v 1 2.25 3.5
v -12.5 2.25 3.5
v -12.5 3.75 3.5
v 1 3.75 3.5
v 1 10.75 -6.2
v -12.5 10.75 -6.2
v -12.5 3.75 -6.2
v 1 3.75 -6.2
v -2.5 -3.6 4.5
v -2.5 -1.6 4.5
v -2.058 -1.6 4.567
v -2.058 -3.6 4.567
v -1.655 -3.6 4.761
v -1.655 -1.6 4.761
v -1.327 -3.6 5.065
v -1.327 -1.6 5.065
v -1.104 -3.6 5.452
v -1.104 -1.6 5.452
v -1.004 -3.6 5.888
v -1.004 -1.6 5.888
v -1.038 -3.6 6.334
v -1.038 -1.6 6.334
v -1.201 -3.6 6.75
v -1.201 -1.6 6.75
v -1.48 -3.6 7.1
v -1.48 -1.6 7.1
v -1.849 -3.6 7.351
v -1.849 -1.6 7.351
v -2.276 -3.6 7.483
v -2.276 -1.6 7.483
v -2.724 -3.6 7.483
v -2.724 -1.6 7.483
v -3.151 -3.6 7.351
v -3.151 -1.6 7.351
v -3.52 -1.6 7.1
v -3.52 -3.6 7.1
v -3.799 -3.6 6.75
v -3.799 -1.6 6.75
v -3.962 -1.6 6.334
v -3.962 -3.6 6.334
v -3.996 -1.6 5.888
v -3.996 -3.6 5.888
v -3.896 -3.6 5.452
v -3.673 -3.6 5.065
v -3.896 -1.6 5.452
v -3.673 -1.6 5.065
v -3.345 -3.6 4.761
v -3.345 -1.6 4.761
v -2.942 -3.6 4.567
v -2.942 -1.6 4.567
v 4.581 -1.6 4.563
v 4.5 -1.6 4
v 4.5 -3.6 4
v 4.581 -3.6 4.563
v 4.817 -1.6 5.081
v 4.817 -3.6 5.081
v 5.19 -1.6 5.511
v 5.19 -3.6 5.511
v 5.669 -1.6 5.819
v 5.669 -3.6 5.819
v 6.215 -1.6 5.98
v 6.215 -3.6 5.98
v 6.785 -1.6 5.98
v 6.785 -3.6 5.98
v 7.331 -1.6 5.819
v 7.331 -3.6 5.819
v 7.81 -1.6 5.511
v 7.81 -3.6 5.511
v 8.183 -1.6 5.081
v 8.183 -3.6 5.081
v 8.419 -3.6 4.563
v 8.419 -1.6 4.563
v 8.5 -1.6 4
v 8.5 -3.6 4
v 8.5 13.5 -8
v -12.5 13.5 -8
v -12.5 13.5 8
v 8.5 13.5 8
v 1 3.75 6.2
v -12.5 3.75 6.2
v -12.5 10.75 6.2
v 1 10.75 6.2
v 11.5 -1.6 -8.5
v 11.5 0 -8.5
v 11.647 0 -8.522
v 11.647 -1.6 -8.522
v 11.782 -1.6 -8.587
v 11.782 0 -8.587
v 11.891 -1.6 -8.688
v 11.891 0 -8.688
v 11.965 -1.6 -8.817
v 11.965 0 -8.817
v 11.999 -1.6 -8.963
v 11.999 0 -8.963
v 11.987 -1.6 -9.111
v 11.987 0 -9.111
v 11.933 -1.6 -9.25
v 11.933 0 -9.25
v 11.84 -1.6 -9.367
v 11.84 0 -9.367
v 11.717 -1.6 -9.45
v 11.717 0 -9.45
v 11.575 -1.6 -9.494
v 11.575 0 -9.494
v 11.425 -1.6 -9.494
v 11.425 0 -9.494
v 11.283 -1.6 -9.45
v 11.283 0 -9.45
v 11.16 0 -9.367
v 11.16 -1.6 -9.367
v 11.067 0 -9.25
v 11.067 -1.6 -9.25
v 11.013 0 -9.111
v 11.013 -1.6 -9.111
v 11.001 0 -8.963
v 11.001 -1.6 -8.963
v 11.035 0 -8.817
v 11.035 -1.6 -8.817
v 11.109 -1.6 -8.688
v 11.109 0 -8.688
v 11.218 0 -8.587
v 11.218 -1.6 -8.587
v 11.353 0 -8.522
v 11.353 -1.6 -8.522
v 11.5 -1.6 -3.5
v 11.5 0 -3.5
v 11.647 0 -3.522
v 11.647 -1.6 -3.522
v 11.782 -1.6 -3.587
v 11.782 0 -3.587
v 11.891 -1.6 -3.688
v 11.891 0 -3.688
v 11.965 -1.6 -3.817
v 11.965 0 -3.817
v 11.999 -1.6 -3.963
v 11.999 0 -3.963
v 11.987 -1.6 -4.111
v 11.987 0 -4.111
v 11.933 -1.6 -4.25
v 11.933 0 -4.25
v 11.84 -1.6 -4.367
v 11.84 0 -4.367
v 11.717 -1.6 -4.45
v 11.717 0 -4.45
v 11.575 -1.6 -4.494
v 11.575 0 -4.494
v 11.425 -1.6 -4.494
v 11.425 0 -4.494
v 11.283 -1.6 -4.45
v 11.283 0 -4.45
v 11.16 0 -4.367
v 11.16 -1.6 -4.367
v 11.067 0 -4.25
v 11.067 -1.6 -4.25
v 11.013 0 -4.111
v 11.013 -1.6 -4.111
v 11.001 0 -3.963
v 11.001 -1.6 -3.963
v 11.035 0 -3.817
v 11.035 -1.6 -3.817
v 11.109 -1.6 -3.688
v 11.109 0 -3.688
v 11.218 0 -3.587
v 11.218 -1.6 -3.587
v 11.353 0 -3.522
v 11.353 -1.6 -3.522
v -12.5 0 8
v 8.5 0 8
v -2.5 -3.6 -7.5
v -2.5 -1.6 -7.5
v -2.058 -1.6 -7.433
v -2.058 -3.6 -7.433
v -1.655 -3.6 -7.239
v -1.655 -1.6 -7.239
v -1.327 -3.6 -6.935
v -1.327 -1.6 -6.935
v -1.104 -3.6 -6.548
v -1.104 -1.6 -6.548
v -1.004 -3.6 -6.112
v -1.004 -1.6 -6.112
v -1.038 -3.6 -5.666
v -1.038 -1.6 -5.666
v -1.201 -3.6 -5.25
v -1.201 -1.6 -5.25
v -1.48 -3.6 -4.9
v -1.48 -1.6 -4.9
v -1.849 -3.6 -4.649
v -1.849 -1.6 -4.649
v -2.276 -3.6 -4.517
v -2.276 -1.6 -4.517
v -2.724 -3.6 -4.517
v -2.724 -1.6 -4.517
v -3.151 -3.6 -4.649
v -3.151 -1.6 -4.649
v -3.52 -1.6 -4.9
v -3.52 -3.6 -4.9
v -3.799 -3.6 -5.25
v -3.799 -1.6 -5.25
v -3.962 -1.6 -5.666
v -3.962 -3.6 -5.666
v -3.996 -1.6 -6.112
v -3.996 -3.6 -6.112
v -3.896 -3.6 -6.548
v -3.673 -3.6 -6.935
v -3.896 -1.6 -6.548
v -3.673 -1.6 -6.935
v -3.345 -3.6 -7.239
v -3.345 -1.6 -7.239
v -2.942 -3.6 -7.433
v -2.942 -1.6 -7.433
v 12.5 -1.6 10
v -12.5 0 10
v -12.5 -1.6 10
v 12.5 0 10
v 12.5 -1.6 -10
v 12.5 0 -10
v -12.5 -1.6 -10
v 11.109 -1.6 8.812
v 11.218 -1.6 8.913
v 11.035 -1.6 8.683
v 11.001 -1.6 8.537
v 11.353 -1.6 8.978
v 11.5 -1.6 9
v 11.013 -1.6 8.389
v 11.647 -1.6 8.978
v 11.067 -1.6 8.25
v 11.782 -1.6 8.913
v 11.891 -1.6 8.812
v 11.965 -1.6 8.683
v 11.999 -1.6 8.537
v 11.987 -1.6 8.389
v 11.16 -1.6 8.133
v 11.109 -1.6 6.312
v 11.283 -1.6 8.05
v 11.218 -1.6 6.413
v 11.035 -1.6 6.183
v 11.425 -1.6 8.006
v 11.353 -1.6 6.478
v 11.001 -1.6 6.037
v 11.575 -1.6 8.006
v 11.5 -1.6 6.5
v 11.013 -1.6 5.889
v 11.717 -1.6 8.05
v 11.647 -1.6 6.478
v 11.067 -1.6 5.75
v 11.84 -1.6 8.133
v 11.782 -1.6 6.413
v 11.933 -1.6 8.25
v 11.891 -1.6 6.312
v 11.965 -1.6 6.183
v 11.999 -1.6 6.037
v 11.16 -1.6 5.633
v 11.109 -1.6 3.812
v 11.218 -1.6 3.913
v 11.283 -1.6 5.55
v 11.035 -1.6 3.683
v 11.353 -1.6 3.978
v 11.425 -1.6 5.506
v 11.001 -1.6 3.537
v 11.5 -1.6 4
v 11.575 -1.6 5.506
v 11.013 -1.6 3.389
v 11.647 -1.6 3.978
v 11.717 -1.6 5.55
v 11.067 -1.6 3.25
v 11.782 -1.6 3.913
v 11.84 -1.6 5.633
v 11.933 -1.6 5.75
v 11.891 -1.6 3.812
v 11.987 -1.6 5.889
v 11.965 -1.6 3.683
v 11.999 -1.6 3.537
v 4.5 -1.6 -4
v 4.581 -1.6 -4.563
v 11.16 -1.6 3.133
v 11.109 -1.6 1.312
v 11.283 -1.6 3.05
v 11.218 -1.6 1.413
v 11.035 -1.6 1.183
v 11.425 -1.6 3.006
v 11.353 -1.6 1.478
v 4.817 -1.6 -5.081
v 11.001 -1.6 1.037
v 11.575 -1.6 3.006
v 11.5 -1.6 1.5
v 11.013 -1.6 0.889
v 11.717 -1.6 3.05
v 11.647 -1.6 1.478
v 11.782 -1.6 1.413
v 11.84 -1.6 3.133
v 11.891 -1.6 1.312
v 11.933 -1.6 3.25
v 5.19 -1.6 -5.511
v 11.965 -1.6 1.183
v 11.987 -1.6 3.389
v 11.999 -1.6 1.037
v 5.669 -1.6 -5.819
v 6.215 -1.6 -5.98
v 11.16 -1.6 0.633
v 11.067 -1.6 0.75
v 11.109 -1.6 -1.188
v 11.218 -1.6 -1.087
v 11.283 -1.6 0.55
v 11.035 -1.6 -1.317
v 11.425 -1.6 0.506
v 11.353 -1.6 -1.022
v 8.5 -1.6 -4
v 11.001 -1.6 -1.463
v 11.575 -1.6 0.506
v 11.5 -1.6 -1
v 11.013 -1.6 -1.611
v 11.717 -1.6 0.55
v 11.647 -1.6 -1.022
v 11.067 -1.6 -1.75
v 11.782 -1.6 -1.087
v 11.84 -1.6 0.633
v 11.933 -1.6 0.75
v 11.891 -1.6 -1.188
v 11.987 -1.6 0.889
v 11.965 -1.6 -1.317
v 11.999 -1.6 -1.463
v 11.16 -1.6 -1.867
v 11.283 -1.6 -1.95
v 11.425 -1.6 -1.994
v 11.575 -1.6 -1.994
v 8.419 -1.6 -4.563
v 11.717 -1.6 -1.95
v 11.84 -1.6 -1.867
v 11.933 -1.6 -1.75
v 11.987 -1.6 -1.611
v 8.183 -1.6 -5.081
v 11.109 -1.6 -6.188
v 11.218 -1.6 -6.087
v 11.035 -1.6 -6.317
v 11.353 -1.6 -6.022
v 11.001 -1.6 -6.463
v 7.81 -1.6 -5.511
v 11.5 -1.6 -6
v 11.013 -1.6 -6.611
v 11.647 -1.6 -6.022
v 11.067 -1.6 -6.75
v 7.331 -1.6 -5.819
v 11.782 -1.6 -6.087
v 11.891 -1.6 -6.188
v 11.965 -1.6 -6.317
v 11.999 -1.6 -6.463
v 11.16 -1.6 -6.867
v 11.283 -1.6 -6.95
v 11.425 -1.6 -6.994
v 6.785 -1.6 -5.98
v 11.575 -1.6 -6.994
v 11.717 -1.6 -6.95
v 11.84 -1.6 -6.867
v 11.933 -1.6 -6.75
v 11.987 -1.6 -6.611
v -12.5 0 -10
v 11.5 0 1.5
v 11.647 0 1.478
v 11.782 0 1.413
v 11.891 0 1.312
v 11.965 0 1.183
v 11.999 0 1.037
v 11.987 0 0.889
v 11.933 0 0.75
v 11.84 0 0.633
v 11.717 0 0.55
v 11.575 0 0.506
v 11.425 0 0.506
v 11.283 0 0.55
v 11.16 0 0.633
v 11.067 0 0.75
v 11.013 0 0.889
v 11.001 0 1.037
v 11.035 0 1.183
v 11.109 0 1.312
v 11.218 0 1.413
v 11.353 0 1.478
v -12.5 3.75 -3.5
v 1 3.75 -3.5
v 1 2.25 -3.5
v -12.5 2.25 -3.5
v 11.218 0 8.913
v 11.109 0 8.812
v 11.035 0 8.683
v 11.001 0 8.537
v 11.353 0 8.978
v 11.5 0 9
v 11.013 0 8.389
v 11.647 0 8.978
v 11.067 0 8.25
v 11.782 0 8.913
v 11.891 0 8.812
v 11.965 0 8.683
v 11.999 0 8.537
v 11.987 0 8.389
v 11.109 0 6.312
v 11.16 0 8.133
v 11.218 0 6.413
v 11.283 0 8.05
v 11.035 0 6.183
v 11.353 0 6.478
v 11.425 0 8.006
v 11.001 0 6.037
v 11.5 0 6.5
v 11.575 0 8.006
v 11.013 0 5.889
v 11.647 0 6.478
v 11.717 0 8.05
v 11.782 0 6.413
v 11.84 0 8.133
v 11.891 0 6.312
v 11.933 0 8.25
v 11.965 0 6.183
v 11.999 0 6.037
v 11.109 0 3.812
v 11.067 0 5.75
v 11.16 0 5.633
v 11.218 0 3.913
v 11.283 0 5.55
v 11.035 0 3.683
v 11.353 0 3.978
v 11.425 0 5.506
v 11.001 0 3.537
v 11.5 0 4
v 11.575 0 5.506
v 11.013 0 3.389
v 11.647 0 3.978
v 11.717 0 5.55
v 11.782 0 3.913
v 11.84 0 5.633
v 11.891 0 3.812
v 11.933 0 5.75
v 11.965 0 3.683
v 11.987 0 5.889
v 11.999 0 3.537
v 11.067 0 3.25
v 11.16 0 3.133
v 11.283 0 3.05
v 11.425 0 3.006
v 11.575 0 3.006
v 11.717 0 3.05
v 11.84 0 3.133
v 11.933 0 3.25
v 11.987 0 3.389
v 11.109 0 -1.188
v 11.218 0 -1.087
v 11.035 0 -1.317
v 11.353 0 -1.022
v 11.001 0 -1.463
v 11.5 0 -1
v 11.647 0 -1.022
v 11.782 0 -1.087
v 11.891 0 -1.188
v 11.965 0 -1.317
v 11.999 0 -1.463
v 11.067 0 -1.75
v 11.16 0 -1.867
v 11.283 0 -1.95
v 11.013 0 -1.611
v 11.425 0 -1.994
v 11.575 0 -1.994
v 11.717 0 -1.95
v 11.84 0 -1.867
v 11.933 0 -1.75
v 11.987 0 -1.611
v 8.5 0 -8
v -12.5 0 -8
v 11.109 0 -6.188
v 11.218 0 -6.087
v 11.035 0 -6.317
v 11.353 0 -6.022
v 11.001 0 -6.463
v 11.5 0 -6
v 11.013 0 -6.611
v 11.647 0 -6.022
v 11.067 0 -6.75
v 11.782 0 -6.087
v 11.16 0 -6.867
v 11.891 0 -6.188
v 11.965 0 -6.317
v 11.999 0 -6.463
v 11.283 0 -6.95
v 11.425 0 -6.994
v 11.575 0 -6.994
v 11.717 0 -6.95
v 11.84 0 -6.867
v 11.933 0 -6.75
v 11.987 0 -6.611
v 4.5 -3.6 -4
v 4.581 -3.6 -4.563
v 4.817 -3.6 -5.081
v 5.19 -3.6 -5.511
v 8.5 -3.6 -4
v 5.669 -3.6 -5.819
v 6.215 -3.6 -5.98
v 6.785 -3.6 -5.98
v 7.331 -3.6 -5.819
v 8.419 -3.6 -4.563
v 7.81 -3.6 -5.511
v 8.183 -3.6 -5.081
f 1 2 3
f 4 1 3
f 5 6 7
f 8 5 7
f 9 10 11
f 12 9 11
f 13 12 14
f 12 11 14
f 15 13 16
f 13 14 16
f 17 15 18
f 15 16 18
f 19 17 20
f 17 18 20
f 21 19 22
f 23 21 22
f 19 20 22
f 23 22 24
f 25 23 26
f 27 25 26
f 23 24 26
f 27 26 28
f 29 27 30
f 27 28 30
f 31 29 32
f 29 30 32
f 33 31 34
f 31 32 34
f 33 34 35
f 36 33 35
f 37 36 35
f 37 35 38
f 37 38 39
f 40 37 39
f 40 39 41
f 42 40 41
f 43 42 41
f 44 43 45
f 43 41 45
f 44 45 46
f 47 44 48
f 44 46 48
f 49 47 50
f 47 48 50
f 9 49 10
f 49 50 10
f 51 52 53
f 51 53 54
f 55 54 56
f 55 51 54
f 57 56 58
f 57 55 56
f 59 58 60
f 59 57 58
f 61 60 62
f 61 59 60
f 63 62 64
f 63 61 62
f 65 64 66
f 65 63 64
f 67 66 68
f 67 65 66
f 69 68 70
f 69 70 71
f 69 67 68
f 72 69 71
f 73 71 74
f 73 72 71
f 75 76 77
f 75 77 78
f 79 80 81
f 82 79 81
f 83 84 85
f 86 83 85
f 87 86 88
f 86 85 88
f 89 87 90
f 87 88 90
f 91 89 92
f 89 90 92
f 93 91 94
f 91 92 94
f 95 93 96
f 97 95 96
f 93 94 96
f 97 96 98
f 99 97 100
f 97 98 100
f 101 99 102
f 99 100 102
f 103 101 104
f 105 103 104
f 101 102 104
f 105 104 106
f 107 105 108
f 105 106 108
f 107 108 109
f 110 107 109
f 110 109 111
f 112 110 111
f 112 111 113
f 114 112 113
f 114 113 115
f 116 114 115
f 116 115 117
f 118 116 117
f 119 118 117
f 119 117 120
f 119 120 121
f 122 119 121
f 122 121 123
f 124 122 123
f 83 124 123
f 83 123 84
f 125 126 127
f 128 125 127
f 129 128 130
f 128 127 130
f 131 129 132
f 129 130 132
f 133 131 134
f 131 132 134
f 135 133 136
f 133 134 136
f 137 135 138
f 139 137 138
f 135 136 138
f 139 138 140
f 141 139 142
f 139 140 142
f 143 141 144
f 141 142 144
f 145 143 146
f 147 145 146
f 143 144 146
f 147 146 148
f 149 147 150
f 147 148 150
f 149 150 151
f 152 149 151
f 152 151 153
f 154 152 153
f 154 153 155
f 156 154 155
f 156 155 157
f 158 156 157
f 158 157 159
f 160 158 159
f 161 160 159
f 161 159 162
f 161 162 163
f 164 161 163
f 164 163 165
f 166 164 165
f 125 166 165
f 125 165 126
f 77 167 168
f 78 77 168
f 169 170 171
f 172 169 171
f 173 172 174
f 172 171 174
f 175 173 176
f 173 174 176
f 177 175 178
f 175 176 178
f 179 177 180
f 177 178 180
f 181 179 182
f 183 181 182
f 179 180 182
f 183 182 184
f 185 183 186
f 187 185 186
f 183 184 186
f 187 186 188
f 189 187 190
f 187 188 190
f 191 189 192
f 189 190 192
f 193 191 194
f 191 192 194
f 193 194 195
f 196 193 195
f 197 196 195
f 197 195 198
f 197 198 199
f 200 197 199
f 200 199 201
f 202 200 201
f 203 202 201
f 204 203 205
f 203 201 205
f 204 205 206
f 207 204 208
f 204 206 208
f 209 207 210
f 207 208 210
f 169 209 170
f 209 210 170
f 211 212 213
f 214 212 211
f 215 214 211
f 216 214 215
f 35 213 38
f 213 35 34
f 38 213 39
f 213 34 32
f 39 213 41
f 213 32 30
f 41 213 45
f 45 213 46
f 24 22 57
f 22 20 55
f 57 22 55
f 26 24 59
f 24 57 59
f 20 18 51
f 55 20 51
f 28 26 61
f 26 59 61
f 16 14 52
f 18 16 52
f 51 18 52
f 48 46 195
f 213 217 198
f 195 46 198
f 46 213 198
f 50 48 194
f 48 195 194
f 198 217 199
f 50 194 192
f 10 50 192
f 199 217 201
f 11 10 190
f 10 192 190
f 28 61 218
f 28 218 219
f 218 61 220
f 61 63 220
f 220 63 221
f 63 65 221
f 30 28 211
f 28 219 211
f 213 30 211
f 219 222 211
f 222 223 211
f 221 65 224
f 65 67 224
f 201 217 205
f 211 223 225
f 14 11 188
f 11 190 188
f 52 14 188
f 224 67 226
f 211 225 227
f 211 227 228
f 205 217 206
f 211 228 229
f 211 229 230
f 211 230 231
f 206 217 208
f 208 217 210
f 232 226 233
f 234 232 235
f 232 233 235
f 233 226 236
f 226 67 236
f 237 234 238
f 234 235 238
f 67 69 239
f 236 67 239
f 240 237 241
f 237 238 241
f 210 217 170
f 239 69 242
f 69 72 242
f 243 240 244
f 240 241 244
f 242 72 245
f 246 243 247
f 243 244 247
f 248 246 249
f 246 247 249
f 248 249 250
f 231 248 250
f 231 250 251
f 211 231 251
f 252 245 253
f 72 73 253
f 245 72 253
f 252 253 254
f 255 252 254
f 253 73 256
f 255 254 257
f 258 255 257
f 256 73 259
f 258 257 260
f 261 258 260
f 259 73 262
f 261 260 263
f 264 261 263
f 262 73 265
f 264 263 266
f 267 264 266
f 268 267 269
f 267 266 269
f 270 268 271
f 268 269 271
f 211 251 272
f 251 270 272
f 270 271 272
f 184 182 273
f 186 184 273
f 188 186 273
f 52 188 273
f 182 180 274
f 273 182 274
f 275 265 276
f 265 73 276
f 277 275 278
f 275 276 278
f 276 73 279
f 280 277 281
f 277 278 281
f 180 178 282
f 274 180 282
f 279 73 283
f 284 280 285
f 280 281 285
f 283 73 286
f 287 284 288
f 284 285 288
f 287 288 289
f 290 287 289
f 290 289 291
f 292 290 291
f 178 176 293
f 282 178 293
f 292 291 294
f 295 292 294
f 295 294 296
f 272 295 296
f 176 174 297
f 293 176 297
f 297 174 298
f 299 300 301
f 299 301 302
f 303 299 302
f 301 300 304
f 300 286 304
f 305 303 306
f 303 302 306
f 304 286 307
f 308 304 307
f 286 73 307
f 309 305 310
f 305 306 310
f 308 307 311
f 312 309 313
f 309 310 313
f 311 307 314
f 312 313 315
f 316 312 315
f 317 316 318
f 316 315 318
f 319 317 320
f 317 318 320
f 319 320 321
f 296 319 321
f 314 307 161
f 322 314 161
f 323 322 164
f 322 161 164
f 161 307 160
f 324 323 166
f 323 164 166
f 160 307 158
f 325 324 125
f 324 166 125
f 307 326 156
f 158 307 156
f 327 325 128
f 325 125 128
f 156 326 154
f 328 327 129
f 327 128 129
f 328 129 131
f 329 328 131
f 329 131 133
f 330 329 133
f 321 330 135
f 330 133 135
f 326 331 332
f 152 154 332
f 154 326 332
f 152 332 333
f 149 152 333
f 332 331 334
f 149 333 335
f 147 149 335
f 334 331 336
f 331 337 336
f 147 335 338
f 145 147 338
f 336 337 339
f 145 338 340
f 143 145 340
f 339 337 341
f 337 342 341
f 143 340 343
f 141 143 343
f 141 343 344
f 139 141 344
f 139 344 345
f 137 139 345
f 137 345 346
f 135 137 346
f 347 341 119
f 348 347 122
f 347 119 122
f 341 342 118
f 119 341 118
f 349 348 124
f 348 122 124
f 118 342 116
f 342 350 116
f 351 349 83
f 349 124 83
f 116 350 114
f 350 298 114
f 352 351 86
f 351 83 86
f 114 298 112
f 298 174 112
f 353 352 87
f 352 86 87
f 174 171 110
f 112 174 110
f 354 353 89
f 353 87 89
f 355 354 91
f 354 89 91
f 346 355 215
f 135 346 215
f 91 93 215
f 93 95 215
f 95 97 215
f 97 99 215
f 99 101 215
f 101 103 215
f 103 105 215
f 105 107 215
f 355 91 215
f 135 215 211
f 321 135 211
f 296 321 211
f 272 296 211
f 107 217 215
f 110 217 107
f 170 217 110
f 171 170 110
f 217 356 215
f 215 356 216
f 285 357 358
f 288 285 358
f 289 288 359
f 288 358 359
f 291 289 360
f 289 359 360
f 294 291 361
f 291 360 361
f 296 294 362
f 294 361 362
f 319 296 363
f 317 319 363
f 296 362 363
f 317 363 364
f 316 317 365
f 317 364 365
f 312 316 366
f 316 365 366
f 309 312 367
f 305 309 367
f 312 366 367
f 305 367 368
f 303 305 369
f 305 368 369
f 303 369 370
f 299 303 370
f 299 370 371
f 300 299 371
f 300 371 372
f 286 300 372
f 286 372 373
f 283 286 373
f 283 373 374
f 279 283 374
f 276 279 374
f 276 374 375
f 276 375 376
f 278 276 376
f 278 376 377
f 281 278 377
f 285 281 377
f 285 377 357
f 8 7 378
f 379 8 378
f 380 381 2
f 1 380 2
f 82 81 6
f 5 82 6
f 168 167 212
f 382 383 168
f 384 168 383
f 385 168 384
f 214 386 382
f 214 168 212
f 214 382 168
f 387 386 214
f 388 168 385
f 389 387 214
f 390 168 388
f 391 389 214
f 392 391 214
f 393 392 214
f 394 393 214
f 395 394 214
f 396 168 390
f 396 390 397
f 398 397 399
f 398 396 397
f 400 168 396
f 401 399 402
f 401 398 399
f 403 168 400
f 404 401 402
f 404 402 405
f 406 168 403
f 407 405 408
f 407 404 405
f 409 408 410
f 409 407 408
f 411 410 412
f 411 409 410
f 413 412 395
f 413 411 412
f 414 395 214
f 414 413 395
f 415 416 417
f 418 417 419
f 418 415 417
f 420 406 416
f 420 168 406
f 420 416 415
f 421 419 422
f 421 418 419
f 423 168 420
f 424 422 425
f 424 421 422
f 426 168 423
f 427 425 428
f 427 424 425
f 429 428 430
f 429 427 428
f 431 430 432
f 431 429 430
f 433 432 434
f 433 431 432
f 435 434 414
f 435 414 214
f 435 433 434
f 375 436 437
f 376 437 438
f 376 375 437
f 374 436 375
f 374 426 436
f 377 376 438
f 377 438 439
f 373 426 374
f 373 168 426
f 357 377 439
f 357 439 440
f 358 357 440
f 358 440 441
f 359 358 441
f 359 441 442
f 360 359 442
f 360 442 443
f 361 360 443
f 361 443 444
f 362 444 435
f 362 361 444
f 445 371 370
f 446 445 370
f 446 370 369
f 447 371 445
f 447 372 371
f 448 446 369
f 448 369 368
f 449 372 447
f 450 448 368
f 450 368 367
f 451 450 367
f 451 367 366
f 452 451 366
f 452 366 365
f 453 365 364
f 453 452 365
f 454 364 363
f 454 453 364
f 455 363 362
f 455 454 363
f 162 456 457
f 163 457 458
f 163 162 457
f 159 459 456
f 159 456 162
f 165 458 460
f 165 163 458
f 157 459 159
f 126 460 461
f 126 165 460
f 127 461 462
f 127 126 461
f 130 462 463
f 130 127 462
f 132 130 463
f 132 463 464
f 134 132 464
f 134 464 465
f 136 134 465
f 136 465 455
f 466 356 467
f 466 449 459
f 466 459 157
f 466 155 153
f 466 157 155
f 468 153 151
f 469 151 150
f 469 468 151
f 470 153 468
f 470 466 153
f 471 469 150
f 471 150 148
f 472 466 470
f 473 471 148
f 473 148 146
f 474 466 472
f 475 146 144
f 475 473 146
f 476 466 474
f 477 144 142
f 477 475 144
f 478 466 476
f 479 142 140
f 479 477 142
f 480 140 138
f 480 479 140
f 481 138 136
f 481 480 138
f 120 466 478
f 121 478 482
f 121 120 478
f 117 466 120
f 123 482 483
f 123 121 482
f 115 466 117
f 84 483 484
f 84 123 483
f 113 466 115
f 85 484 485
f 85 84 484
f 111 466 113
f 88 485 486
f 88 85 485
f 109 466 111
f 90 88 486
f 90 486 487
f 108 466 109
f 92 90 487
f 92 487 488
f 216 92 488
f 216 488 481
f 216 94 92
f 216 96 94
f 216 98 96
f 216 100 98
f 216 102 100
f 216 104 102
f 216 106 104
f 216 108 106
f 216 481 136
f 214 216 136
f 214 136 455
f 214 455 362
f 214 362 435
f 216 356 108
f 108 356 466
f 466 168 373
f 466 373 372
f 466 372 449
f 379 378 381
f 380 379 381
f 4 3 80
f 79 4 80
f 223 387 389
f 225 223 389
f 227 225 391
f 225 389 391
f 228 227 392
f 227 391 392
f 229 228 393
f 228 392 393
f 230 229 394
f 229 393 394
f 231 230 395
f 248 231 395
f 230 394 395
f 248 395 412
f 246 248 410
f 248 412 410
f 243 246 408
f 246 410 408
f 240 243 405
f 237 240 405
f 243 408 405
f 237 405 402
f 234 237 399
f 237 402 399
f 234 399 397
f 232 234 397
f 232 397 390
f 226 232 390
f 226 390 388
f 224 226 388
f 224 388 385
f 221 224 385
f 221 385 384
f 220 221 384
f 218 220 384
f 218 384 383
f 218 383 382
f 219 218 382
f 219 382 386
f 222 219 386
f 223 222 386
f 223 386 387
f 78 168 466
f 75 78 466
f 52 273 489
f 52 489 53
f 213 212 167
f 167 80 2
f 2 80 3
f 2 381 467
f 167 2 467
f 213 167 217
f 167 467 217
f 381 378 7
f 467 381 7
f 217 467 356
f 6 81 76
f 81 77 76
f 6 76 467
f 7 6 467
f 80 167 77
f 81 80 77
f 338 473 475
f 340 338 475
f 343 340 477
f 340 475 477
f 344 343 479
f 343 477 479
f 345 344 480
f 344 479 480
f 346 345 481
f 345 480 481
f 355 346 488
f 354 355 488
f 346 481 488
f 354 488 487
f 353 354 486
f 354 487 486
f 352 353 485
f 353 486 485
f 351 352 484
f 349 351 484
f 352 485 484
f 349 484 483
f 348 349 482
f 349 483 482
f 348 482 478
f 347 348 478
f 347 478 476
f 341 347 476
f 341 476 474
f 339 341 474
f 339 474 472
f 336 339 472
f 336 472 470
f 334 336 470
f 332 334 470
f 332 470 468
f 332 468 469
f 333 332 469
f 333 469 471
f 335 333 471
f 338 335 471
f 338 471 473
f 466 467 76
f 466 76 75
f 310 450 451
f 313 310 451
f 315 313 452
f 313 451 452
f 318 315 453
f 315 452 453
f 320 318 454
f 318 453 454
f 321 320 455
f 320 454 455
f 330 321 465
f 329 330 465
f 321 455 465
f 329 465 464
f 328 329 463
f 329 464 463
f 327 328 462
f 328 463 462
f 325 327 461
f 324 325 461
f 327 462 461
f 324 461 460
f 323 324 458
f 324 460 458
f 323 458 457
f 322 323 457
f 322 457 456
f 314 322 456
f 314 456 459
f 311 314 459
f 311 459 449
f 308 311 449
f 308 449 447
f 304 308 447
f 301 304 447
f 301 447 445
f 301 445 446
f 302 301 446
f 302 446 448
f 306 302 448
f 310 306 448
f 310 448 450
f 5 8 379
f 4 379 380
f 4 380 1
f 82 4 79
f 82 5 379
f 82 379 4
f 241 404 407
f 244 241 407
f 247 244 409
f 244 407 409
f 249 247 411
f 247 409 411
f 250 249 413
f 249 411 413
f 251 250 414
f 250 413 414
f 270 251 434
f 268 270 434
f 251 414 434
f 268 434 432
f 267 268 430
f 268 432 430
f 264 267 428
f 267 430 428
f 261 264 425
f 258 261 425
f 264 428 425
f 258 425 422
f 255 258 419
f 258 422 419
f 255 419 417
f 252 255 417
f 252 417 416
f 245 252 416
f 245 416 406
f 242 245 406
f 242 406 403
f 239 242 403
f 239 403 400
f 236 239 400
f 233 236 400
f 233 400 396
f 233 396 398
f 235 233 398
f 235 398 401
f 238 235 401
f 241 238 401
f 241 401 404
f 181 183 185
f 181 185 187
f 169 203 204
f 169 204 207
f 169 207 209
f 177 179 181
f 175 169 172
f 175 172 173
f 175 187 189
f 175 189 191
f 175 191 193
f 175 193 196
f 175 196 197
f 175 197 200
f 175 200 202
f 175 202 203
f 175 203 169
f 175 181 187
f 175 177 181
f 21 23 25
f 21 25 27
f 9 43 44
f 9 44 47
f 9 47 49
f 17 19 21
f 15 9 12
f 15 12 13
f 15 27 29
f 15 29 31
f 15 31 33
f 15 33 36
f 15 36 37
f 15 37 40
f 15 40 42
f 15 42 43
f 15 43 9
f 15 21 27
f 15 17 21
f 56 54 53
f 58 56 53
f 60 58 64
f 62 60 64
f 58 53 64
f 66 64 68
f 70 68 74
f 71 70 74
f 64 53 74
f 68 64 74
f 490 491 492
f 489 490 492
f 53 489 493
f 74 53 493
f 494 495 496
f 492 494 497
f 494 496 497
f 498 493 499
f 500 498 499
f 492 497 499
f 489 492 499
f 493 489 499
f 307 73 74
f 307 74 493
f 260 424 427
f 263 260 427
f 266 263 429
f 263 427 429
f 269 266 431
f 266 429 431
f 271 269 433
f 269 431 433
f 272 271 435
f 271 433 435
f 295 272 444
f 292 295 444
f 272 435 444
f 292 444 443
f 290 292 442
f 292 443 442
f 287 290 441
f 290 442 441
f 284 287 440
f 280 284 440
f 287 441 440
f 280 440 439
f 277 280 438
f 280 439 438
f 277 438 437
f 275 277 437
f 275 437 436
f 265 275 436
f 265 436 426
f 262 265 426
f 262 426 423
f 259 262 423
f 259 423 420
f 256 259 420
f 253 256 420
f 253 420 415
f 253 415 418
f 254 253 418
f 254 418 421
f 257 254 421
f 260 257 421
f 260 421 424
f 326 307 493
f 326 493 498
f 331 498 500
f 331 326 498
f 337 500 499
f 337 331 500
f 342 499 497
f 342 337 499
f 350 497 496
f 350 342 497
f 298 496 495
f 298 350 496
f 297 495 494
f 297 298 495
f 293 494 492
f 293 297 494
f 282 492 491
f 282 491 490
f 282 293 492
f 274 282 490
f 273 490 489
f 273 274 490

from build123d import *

# Parameters (mm, degrees)
SKETCH1_W           = 25
SKETCH1_H           = 20
BOSS_EXTRUDE1_DEPTH = 1.6
SKETCH2_W           = 21
SKETCH2_H           = 16
BOSS_EXTRUDE2_DEPTH = 13.5
CUT_EXTRUDE1_DEPTH  = 13.5
SKETCH4_R           = 0.5
CUT_EXTRUDE2_DEPTH  = 13.5
BOSS_EXTRUDE3_DEPTH = 2
SKETCH6_R           = 1.5
BOSS_EXTRUDE4_DEPTH = 2


with BuildPart() as part:
    # Sketch1 → Boss-Extrude1 (new body)
    with BuildSketch(Plane(origin=(0, 0, 0), x_dir=(1, 0, 0), z_dir=(0, 1, 0))):
        Rectangle(SKETCH1_W, SKETCH1_H)
    extrude(amount=-BOSS_EXTRUDE1_DEPTH)

    # Sketch2 → Boss-Extrude2 (add)
    with BuildSketch(Plane(origin=(0, 0, 0), x_dir=(1, 0, 0), z_dir=(0, 1, 0))):
        with Locations((-2, 0)):
            Rectangle(SKETCH2_W, SKETCH2_H)
    extrude(amount=BOSS_EXTRUDE2_DEPTH)

    # Sketch3 → Cut-Extrude1 (cut)
    with BuildSketch(Plane.ZY.offset(12.5)):
        Polygon((-6.2, 3.75), (-3.5, 3.75), (-3.5, 2.25), (3.5, 2.25), (3.5, 3.75), (6.2, 3.75), (6.2, 10.75), (-6.2, 10.75), align=None)
    extrude(amount=-CUT_EXTRUDE1_DEPTH, mode=Mode.SUBTRACT)

    # Sketch4 → Cut-Extrude2 (cut)
    with BuildSketch(Plane(origin=(0, 0, 0), x_dir=(1, 0, 0), z_dir=(0, 1, 0))):
        with Locations(Location((11.5, 9, 0), (0, 0, 270))):
            Circle(SKETCH4_R)
        with Locations(Location((11.5, 6.5, 0), (0, 0, 270))):
            Circle(SKETCH4_R)
        with Locations(Location((11.5, 4, 0), (0, 0, 270))):
            Circle(SKETCH4_R)
        with Locations(Location((11.5, 1.5, 0), (0, 0, 270))):
            Circle(SKETCH4_R)
        with Locations(Location((11.5, -1, 0), (0, 0, 270))):
            Circle(SKETCH4_R)
        with Locations(Location((11.5, -3.5, 0), (0, 0, 270))):
            Circle(SKETCH4_R)
        with Locations(Location((11.5, -6, 0), (0, 0, 270))):
            Circle(SKETCH4_R)
        with Locations(Location((11.5, -8.5, 0), (0, 0, 270))):
            Circle(SKETCH4_R)
    extrude(amount=-CUT_EXTRUDE2_DEPTH, mode=Mode.SUBTRACT)

    # Sketch5 → Boss-Extrude3 (add)
    with BuildSketch(Plane(origin=(0, -1.6, 0), x_dir=(-1, 0, 0), z_dir=(0, -1, 0))):
        with BuildLine():
            Line((-8.5, -4), (-8.5, 4))
            ThreePointArc((-8.5, 4), (-6.5, 6), (-4.5, 4))
            Line((-4.5, 4), (-4.5, -4))
            ThreePointArc((-4.5, -4), (-6.5, -6), (-8.5, -4))
        make_face()
    extrude(amount=BOSS_EXTRUDE3_DEPTH)

    # Sketch6 → Boss-Extrude4 (add)
    with BuildSketch(Plane.XZ.offset(1.6)):
        with Locations(Location((-2.5, 6, 0), (0, 0, 270))):
            Circle(SKETCH6_R)
        with Locations(Location((-2.5, -6, 0), (0, 0, 270))):
            Circle(SKETCH6_R)
    extrude(amount=BOSS_EXTRUDE4_DEPTH)


solid = part.part
